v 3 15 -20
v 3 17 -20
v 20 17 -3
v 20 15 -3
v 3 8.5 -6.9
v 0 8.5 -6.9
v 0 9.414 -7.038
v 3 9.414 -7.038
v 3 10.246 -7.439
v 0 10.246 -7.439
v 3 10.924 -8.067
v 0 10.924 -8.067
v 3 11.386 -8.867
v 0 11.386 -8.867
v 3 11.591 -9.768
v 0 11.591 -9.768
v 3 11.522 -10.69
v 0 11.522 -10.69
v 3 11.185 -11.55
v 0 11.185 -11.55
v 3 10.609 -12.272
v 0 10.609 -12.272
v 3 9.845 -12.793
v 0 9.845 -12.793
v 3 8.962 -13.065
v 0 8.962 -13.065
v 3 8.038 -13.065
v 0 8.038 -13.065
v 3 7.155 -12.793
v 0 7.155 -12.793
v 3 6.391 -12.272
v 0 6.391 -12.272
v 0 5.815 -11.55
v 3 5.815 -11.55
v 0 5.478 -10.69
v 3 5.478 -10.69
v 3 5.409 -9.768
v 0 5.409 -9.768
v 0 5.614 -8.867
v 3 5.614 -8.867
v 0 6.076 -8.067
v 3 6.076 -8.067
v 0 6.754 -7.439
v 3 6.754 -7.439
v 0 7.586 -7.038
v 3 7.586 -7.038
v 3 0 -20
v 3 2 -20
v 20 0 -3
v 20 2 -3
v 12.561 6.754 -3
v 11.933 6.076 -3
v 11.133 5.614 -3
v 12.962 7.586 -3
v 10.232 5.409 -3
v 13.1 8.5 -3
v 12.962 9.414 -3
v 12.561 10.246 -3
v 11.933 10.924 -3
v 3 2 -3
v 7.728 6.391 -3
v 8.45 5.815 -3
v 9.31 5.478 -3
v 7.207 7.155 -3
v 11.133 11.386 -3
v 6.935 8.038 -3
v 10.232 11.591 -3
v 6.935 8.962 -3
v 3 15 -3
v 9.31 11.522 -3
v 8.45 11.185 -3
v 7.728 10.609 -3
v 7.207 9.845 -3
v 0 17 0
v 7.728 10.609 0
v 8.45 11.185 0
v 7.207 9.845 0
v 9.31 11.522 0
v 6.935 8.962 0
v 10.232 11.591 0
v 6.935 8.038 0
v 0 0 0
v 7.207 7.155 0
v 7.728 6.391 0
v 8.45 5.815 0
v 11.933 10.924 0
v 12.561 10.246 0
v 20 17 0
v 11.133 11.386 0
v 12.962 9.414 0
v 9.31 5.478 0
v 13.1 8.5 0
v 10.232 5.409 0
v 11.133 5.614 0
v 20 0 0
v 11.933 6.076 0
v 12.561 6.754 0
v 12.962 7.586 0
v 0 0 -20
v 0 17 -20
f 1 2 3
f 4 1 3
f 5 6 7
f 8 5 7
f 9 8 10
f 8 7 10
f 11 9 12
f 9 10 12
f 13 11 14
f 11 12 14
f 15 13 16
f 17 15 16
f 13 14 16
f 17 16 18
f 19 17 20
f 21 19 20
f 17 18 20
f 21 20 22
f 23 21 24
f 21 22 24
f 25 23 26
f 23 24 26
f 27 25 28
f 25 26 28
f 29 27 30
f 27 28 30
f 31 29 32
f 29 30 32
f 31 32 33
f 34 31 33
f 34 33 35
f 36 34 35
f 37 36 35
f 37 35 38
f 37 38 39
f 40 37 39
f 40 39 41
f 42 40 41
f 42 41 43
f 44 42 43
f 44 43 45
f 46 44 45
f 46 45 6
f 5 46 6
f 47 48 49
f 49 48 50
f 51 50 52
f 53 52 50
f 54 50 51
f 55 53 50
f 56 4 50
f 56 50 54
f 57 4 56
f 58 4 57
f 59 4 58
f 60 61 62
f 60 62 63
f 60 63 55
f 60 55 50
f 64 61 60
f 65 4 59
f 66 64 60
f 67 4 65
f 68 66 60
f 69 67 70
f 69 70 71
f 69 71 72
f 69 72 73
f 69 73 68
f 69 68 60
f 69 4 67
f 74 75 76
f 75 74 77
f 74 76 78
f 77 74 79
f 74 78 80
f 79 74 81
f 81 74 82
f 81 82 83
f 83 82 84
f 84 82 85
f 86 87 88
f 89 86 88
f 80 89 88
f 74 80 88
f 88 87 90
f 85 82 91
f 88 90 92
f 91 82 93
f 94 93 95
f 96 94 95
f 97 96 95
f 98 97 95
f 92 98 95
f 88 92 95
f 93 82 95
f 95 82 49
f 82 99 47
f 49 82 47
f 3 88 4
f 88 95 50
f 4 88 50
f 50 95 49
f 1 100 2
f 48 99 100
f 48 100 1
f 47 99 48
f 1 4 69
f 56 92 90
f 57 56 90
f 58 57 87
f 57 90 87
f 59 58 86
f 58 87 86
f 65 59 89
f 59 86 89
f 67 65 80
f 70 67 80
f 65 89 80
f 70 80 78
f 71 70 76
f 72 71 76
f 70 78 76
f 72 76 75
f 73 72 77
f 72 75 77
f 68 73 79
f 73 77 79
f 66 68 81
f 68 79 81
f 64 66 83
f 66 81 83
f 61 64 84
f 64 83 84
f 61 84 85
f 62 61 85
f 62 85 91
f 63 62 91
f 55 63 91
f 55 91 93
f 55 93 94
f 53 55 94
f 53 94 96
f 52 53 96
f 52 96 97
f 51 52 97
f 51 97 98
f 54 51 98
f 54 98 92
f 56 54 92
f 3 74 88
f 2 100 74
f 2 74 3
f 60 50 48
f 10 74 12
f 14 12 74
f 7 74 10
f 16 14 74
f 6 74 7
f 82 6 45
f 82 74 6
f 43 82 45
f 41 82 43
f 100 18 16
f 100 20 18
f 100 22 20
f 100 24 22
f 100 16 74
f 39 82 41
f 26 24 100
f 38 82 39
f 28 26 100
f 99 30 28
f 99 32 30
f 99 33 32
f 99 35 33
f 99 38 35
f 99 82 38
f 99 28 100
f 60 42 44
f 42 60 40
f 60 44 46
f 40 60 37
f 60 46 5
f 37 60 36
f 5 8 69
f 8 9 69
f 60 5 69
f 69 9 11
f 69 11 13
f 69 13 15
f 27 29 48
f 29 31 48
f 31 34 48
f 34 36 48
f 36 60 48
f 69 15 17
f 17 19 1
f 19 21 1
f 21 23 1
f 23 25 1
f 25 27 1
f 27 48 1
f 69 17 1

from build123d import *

# Parameters (mm, degrees)
SKETCH1_W           = 20
SKETCH1_H           = 20
BOSS_EXTRUDE1_DEPTH = 17
CUT_EXTRUDE1_DEPTH  = 17
SKETCH3_W           = 17
SKETCH3_H           = 13
CUT_EXTRUDE2_DEPTH  = 17
CUT_EXTRUDE3_REACH  = 35
SKETCH4_R           = 3.1
CUT_EXTRUDE4_REACH  = 35
SKETCH5_R           = 3.1


with BuildPart() as part:
    # Sketch1 → Boss-Extrude1 (new body)
    with BuildSketch(Plane(origin=(0, 0, 0), x_dir=(1, 0, 0), z_dir=(0, 1, 0))):
        with Locations((10, 10)):
            Rectangle(SKETCH1_W, SKETCH1_H)
    extrude(amount=BOSS_EXTRUDE1_DEPTH)

    # Sketch2 → Cut-Extrude1 (cut)
    with BuildSketch(Plane(origin=(0, 17, 0), x_dir=(1, 0, 0), z_dir=(0, 1, 0))):
        Polygon((3, 20), (20, 3), (20, 20), align=None)
    extrude(amount=-CUT_EXTRUDE1_DEPTH, mode=Mode.SUBTRACT)

    # Sketch3 → Cut-Extrude2 (cut)
    with BuildSketch(Plane(origin=(0, 0, -20), x_dir=(-1, 0, 0), z_dir=(0, 0, -1))):
        with Locations((-11.5, 8.5)):
            Rectangle(SKETCH3_W, SKETCH3_H)
    extrude(amount=-CUT_EXTRUDE2_DEPTH, mode=Mode.SUBTRACT)

    # Sketch4 → Cut-Extrude3 (cut, up to next)
    with BuildSketch(Plane.ZY, mode=Mode.PRIVATE) as cut_extrude3_sk1:
        with Locations((-10, 8.5)):
            Circle(SKETCH4_R)
    cut_extrude3_tool1 = extrude(cut_extrude3_sk1.sketch, amount=-CUT_EXTRUDE3_REACH, mode=Mode.PRIVATE) & part.part
    add(cut_extrude3_tool1.solids().sort_by_distance((0, 8.5, -10))[0], mode=Mode.SUBTRACT)

    # Sketch5 → Cut-Extrude4 (cut, up to next)
    with BuildSketch(Plane.XY, mode=Mode.PRIVATE) as cut_extrude4_sk1:
        with Locations((10, 8.5)):
            Circle(SKETCH5_R)
    cut_extrude4_tool1 = extrude(cut_extrude4_sk1.sketch, amount=-CUT_EXTRUDE4_REACH, mode=Mode.PRIVATE) & part.part
    add(cut_extrude4_tool1.solids().sort_by_distance((10, 8.5, 0))[0], mode=Mode.SUBTRACT)


solid = part.part
